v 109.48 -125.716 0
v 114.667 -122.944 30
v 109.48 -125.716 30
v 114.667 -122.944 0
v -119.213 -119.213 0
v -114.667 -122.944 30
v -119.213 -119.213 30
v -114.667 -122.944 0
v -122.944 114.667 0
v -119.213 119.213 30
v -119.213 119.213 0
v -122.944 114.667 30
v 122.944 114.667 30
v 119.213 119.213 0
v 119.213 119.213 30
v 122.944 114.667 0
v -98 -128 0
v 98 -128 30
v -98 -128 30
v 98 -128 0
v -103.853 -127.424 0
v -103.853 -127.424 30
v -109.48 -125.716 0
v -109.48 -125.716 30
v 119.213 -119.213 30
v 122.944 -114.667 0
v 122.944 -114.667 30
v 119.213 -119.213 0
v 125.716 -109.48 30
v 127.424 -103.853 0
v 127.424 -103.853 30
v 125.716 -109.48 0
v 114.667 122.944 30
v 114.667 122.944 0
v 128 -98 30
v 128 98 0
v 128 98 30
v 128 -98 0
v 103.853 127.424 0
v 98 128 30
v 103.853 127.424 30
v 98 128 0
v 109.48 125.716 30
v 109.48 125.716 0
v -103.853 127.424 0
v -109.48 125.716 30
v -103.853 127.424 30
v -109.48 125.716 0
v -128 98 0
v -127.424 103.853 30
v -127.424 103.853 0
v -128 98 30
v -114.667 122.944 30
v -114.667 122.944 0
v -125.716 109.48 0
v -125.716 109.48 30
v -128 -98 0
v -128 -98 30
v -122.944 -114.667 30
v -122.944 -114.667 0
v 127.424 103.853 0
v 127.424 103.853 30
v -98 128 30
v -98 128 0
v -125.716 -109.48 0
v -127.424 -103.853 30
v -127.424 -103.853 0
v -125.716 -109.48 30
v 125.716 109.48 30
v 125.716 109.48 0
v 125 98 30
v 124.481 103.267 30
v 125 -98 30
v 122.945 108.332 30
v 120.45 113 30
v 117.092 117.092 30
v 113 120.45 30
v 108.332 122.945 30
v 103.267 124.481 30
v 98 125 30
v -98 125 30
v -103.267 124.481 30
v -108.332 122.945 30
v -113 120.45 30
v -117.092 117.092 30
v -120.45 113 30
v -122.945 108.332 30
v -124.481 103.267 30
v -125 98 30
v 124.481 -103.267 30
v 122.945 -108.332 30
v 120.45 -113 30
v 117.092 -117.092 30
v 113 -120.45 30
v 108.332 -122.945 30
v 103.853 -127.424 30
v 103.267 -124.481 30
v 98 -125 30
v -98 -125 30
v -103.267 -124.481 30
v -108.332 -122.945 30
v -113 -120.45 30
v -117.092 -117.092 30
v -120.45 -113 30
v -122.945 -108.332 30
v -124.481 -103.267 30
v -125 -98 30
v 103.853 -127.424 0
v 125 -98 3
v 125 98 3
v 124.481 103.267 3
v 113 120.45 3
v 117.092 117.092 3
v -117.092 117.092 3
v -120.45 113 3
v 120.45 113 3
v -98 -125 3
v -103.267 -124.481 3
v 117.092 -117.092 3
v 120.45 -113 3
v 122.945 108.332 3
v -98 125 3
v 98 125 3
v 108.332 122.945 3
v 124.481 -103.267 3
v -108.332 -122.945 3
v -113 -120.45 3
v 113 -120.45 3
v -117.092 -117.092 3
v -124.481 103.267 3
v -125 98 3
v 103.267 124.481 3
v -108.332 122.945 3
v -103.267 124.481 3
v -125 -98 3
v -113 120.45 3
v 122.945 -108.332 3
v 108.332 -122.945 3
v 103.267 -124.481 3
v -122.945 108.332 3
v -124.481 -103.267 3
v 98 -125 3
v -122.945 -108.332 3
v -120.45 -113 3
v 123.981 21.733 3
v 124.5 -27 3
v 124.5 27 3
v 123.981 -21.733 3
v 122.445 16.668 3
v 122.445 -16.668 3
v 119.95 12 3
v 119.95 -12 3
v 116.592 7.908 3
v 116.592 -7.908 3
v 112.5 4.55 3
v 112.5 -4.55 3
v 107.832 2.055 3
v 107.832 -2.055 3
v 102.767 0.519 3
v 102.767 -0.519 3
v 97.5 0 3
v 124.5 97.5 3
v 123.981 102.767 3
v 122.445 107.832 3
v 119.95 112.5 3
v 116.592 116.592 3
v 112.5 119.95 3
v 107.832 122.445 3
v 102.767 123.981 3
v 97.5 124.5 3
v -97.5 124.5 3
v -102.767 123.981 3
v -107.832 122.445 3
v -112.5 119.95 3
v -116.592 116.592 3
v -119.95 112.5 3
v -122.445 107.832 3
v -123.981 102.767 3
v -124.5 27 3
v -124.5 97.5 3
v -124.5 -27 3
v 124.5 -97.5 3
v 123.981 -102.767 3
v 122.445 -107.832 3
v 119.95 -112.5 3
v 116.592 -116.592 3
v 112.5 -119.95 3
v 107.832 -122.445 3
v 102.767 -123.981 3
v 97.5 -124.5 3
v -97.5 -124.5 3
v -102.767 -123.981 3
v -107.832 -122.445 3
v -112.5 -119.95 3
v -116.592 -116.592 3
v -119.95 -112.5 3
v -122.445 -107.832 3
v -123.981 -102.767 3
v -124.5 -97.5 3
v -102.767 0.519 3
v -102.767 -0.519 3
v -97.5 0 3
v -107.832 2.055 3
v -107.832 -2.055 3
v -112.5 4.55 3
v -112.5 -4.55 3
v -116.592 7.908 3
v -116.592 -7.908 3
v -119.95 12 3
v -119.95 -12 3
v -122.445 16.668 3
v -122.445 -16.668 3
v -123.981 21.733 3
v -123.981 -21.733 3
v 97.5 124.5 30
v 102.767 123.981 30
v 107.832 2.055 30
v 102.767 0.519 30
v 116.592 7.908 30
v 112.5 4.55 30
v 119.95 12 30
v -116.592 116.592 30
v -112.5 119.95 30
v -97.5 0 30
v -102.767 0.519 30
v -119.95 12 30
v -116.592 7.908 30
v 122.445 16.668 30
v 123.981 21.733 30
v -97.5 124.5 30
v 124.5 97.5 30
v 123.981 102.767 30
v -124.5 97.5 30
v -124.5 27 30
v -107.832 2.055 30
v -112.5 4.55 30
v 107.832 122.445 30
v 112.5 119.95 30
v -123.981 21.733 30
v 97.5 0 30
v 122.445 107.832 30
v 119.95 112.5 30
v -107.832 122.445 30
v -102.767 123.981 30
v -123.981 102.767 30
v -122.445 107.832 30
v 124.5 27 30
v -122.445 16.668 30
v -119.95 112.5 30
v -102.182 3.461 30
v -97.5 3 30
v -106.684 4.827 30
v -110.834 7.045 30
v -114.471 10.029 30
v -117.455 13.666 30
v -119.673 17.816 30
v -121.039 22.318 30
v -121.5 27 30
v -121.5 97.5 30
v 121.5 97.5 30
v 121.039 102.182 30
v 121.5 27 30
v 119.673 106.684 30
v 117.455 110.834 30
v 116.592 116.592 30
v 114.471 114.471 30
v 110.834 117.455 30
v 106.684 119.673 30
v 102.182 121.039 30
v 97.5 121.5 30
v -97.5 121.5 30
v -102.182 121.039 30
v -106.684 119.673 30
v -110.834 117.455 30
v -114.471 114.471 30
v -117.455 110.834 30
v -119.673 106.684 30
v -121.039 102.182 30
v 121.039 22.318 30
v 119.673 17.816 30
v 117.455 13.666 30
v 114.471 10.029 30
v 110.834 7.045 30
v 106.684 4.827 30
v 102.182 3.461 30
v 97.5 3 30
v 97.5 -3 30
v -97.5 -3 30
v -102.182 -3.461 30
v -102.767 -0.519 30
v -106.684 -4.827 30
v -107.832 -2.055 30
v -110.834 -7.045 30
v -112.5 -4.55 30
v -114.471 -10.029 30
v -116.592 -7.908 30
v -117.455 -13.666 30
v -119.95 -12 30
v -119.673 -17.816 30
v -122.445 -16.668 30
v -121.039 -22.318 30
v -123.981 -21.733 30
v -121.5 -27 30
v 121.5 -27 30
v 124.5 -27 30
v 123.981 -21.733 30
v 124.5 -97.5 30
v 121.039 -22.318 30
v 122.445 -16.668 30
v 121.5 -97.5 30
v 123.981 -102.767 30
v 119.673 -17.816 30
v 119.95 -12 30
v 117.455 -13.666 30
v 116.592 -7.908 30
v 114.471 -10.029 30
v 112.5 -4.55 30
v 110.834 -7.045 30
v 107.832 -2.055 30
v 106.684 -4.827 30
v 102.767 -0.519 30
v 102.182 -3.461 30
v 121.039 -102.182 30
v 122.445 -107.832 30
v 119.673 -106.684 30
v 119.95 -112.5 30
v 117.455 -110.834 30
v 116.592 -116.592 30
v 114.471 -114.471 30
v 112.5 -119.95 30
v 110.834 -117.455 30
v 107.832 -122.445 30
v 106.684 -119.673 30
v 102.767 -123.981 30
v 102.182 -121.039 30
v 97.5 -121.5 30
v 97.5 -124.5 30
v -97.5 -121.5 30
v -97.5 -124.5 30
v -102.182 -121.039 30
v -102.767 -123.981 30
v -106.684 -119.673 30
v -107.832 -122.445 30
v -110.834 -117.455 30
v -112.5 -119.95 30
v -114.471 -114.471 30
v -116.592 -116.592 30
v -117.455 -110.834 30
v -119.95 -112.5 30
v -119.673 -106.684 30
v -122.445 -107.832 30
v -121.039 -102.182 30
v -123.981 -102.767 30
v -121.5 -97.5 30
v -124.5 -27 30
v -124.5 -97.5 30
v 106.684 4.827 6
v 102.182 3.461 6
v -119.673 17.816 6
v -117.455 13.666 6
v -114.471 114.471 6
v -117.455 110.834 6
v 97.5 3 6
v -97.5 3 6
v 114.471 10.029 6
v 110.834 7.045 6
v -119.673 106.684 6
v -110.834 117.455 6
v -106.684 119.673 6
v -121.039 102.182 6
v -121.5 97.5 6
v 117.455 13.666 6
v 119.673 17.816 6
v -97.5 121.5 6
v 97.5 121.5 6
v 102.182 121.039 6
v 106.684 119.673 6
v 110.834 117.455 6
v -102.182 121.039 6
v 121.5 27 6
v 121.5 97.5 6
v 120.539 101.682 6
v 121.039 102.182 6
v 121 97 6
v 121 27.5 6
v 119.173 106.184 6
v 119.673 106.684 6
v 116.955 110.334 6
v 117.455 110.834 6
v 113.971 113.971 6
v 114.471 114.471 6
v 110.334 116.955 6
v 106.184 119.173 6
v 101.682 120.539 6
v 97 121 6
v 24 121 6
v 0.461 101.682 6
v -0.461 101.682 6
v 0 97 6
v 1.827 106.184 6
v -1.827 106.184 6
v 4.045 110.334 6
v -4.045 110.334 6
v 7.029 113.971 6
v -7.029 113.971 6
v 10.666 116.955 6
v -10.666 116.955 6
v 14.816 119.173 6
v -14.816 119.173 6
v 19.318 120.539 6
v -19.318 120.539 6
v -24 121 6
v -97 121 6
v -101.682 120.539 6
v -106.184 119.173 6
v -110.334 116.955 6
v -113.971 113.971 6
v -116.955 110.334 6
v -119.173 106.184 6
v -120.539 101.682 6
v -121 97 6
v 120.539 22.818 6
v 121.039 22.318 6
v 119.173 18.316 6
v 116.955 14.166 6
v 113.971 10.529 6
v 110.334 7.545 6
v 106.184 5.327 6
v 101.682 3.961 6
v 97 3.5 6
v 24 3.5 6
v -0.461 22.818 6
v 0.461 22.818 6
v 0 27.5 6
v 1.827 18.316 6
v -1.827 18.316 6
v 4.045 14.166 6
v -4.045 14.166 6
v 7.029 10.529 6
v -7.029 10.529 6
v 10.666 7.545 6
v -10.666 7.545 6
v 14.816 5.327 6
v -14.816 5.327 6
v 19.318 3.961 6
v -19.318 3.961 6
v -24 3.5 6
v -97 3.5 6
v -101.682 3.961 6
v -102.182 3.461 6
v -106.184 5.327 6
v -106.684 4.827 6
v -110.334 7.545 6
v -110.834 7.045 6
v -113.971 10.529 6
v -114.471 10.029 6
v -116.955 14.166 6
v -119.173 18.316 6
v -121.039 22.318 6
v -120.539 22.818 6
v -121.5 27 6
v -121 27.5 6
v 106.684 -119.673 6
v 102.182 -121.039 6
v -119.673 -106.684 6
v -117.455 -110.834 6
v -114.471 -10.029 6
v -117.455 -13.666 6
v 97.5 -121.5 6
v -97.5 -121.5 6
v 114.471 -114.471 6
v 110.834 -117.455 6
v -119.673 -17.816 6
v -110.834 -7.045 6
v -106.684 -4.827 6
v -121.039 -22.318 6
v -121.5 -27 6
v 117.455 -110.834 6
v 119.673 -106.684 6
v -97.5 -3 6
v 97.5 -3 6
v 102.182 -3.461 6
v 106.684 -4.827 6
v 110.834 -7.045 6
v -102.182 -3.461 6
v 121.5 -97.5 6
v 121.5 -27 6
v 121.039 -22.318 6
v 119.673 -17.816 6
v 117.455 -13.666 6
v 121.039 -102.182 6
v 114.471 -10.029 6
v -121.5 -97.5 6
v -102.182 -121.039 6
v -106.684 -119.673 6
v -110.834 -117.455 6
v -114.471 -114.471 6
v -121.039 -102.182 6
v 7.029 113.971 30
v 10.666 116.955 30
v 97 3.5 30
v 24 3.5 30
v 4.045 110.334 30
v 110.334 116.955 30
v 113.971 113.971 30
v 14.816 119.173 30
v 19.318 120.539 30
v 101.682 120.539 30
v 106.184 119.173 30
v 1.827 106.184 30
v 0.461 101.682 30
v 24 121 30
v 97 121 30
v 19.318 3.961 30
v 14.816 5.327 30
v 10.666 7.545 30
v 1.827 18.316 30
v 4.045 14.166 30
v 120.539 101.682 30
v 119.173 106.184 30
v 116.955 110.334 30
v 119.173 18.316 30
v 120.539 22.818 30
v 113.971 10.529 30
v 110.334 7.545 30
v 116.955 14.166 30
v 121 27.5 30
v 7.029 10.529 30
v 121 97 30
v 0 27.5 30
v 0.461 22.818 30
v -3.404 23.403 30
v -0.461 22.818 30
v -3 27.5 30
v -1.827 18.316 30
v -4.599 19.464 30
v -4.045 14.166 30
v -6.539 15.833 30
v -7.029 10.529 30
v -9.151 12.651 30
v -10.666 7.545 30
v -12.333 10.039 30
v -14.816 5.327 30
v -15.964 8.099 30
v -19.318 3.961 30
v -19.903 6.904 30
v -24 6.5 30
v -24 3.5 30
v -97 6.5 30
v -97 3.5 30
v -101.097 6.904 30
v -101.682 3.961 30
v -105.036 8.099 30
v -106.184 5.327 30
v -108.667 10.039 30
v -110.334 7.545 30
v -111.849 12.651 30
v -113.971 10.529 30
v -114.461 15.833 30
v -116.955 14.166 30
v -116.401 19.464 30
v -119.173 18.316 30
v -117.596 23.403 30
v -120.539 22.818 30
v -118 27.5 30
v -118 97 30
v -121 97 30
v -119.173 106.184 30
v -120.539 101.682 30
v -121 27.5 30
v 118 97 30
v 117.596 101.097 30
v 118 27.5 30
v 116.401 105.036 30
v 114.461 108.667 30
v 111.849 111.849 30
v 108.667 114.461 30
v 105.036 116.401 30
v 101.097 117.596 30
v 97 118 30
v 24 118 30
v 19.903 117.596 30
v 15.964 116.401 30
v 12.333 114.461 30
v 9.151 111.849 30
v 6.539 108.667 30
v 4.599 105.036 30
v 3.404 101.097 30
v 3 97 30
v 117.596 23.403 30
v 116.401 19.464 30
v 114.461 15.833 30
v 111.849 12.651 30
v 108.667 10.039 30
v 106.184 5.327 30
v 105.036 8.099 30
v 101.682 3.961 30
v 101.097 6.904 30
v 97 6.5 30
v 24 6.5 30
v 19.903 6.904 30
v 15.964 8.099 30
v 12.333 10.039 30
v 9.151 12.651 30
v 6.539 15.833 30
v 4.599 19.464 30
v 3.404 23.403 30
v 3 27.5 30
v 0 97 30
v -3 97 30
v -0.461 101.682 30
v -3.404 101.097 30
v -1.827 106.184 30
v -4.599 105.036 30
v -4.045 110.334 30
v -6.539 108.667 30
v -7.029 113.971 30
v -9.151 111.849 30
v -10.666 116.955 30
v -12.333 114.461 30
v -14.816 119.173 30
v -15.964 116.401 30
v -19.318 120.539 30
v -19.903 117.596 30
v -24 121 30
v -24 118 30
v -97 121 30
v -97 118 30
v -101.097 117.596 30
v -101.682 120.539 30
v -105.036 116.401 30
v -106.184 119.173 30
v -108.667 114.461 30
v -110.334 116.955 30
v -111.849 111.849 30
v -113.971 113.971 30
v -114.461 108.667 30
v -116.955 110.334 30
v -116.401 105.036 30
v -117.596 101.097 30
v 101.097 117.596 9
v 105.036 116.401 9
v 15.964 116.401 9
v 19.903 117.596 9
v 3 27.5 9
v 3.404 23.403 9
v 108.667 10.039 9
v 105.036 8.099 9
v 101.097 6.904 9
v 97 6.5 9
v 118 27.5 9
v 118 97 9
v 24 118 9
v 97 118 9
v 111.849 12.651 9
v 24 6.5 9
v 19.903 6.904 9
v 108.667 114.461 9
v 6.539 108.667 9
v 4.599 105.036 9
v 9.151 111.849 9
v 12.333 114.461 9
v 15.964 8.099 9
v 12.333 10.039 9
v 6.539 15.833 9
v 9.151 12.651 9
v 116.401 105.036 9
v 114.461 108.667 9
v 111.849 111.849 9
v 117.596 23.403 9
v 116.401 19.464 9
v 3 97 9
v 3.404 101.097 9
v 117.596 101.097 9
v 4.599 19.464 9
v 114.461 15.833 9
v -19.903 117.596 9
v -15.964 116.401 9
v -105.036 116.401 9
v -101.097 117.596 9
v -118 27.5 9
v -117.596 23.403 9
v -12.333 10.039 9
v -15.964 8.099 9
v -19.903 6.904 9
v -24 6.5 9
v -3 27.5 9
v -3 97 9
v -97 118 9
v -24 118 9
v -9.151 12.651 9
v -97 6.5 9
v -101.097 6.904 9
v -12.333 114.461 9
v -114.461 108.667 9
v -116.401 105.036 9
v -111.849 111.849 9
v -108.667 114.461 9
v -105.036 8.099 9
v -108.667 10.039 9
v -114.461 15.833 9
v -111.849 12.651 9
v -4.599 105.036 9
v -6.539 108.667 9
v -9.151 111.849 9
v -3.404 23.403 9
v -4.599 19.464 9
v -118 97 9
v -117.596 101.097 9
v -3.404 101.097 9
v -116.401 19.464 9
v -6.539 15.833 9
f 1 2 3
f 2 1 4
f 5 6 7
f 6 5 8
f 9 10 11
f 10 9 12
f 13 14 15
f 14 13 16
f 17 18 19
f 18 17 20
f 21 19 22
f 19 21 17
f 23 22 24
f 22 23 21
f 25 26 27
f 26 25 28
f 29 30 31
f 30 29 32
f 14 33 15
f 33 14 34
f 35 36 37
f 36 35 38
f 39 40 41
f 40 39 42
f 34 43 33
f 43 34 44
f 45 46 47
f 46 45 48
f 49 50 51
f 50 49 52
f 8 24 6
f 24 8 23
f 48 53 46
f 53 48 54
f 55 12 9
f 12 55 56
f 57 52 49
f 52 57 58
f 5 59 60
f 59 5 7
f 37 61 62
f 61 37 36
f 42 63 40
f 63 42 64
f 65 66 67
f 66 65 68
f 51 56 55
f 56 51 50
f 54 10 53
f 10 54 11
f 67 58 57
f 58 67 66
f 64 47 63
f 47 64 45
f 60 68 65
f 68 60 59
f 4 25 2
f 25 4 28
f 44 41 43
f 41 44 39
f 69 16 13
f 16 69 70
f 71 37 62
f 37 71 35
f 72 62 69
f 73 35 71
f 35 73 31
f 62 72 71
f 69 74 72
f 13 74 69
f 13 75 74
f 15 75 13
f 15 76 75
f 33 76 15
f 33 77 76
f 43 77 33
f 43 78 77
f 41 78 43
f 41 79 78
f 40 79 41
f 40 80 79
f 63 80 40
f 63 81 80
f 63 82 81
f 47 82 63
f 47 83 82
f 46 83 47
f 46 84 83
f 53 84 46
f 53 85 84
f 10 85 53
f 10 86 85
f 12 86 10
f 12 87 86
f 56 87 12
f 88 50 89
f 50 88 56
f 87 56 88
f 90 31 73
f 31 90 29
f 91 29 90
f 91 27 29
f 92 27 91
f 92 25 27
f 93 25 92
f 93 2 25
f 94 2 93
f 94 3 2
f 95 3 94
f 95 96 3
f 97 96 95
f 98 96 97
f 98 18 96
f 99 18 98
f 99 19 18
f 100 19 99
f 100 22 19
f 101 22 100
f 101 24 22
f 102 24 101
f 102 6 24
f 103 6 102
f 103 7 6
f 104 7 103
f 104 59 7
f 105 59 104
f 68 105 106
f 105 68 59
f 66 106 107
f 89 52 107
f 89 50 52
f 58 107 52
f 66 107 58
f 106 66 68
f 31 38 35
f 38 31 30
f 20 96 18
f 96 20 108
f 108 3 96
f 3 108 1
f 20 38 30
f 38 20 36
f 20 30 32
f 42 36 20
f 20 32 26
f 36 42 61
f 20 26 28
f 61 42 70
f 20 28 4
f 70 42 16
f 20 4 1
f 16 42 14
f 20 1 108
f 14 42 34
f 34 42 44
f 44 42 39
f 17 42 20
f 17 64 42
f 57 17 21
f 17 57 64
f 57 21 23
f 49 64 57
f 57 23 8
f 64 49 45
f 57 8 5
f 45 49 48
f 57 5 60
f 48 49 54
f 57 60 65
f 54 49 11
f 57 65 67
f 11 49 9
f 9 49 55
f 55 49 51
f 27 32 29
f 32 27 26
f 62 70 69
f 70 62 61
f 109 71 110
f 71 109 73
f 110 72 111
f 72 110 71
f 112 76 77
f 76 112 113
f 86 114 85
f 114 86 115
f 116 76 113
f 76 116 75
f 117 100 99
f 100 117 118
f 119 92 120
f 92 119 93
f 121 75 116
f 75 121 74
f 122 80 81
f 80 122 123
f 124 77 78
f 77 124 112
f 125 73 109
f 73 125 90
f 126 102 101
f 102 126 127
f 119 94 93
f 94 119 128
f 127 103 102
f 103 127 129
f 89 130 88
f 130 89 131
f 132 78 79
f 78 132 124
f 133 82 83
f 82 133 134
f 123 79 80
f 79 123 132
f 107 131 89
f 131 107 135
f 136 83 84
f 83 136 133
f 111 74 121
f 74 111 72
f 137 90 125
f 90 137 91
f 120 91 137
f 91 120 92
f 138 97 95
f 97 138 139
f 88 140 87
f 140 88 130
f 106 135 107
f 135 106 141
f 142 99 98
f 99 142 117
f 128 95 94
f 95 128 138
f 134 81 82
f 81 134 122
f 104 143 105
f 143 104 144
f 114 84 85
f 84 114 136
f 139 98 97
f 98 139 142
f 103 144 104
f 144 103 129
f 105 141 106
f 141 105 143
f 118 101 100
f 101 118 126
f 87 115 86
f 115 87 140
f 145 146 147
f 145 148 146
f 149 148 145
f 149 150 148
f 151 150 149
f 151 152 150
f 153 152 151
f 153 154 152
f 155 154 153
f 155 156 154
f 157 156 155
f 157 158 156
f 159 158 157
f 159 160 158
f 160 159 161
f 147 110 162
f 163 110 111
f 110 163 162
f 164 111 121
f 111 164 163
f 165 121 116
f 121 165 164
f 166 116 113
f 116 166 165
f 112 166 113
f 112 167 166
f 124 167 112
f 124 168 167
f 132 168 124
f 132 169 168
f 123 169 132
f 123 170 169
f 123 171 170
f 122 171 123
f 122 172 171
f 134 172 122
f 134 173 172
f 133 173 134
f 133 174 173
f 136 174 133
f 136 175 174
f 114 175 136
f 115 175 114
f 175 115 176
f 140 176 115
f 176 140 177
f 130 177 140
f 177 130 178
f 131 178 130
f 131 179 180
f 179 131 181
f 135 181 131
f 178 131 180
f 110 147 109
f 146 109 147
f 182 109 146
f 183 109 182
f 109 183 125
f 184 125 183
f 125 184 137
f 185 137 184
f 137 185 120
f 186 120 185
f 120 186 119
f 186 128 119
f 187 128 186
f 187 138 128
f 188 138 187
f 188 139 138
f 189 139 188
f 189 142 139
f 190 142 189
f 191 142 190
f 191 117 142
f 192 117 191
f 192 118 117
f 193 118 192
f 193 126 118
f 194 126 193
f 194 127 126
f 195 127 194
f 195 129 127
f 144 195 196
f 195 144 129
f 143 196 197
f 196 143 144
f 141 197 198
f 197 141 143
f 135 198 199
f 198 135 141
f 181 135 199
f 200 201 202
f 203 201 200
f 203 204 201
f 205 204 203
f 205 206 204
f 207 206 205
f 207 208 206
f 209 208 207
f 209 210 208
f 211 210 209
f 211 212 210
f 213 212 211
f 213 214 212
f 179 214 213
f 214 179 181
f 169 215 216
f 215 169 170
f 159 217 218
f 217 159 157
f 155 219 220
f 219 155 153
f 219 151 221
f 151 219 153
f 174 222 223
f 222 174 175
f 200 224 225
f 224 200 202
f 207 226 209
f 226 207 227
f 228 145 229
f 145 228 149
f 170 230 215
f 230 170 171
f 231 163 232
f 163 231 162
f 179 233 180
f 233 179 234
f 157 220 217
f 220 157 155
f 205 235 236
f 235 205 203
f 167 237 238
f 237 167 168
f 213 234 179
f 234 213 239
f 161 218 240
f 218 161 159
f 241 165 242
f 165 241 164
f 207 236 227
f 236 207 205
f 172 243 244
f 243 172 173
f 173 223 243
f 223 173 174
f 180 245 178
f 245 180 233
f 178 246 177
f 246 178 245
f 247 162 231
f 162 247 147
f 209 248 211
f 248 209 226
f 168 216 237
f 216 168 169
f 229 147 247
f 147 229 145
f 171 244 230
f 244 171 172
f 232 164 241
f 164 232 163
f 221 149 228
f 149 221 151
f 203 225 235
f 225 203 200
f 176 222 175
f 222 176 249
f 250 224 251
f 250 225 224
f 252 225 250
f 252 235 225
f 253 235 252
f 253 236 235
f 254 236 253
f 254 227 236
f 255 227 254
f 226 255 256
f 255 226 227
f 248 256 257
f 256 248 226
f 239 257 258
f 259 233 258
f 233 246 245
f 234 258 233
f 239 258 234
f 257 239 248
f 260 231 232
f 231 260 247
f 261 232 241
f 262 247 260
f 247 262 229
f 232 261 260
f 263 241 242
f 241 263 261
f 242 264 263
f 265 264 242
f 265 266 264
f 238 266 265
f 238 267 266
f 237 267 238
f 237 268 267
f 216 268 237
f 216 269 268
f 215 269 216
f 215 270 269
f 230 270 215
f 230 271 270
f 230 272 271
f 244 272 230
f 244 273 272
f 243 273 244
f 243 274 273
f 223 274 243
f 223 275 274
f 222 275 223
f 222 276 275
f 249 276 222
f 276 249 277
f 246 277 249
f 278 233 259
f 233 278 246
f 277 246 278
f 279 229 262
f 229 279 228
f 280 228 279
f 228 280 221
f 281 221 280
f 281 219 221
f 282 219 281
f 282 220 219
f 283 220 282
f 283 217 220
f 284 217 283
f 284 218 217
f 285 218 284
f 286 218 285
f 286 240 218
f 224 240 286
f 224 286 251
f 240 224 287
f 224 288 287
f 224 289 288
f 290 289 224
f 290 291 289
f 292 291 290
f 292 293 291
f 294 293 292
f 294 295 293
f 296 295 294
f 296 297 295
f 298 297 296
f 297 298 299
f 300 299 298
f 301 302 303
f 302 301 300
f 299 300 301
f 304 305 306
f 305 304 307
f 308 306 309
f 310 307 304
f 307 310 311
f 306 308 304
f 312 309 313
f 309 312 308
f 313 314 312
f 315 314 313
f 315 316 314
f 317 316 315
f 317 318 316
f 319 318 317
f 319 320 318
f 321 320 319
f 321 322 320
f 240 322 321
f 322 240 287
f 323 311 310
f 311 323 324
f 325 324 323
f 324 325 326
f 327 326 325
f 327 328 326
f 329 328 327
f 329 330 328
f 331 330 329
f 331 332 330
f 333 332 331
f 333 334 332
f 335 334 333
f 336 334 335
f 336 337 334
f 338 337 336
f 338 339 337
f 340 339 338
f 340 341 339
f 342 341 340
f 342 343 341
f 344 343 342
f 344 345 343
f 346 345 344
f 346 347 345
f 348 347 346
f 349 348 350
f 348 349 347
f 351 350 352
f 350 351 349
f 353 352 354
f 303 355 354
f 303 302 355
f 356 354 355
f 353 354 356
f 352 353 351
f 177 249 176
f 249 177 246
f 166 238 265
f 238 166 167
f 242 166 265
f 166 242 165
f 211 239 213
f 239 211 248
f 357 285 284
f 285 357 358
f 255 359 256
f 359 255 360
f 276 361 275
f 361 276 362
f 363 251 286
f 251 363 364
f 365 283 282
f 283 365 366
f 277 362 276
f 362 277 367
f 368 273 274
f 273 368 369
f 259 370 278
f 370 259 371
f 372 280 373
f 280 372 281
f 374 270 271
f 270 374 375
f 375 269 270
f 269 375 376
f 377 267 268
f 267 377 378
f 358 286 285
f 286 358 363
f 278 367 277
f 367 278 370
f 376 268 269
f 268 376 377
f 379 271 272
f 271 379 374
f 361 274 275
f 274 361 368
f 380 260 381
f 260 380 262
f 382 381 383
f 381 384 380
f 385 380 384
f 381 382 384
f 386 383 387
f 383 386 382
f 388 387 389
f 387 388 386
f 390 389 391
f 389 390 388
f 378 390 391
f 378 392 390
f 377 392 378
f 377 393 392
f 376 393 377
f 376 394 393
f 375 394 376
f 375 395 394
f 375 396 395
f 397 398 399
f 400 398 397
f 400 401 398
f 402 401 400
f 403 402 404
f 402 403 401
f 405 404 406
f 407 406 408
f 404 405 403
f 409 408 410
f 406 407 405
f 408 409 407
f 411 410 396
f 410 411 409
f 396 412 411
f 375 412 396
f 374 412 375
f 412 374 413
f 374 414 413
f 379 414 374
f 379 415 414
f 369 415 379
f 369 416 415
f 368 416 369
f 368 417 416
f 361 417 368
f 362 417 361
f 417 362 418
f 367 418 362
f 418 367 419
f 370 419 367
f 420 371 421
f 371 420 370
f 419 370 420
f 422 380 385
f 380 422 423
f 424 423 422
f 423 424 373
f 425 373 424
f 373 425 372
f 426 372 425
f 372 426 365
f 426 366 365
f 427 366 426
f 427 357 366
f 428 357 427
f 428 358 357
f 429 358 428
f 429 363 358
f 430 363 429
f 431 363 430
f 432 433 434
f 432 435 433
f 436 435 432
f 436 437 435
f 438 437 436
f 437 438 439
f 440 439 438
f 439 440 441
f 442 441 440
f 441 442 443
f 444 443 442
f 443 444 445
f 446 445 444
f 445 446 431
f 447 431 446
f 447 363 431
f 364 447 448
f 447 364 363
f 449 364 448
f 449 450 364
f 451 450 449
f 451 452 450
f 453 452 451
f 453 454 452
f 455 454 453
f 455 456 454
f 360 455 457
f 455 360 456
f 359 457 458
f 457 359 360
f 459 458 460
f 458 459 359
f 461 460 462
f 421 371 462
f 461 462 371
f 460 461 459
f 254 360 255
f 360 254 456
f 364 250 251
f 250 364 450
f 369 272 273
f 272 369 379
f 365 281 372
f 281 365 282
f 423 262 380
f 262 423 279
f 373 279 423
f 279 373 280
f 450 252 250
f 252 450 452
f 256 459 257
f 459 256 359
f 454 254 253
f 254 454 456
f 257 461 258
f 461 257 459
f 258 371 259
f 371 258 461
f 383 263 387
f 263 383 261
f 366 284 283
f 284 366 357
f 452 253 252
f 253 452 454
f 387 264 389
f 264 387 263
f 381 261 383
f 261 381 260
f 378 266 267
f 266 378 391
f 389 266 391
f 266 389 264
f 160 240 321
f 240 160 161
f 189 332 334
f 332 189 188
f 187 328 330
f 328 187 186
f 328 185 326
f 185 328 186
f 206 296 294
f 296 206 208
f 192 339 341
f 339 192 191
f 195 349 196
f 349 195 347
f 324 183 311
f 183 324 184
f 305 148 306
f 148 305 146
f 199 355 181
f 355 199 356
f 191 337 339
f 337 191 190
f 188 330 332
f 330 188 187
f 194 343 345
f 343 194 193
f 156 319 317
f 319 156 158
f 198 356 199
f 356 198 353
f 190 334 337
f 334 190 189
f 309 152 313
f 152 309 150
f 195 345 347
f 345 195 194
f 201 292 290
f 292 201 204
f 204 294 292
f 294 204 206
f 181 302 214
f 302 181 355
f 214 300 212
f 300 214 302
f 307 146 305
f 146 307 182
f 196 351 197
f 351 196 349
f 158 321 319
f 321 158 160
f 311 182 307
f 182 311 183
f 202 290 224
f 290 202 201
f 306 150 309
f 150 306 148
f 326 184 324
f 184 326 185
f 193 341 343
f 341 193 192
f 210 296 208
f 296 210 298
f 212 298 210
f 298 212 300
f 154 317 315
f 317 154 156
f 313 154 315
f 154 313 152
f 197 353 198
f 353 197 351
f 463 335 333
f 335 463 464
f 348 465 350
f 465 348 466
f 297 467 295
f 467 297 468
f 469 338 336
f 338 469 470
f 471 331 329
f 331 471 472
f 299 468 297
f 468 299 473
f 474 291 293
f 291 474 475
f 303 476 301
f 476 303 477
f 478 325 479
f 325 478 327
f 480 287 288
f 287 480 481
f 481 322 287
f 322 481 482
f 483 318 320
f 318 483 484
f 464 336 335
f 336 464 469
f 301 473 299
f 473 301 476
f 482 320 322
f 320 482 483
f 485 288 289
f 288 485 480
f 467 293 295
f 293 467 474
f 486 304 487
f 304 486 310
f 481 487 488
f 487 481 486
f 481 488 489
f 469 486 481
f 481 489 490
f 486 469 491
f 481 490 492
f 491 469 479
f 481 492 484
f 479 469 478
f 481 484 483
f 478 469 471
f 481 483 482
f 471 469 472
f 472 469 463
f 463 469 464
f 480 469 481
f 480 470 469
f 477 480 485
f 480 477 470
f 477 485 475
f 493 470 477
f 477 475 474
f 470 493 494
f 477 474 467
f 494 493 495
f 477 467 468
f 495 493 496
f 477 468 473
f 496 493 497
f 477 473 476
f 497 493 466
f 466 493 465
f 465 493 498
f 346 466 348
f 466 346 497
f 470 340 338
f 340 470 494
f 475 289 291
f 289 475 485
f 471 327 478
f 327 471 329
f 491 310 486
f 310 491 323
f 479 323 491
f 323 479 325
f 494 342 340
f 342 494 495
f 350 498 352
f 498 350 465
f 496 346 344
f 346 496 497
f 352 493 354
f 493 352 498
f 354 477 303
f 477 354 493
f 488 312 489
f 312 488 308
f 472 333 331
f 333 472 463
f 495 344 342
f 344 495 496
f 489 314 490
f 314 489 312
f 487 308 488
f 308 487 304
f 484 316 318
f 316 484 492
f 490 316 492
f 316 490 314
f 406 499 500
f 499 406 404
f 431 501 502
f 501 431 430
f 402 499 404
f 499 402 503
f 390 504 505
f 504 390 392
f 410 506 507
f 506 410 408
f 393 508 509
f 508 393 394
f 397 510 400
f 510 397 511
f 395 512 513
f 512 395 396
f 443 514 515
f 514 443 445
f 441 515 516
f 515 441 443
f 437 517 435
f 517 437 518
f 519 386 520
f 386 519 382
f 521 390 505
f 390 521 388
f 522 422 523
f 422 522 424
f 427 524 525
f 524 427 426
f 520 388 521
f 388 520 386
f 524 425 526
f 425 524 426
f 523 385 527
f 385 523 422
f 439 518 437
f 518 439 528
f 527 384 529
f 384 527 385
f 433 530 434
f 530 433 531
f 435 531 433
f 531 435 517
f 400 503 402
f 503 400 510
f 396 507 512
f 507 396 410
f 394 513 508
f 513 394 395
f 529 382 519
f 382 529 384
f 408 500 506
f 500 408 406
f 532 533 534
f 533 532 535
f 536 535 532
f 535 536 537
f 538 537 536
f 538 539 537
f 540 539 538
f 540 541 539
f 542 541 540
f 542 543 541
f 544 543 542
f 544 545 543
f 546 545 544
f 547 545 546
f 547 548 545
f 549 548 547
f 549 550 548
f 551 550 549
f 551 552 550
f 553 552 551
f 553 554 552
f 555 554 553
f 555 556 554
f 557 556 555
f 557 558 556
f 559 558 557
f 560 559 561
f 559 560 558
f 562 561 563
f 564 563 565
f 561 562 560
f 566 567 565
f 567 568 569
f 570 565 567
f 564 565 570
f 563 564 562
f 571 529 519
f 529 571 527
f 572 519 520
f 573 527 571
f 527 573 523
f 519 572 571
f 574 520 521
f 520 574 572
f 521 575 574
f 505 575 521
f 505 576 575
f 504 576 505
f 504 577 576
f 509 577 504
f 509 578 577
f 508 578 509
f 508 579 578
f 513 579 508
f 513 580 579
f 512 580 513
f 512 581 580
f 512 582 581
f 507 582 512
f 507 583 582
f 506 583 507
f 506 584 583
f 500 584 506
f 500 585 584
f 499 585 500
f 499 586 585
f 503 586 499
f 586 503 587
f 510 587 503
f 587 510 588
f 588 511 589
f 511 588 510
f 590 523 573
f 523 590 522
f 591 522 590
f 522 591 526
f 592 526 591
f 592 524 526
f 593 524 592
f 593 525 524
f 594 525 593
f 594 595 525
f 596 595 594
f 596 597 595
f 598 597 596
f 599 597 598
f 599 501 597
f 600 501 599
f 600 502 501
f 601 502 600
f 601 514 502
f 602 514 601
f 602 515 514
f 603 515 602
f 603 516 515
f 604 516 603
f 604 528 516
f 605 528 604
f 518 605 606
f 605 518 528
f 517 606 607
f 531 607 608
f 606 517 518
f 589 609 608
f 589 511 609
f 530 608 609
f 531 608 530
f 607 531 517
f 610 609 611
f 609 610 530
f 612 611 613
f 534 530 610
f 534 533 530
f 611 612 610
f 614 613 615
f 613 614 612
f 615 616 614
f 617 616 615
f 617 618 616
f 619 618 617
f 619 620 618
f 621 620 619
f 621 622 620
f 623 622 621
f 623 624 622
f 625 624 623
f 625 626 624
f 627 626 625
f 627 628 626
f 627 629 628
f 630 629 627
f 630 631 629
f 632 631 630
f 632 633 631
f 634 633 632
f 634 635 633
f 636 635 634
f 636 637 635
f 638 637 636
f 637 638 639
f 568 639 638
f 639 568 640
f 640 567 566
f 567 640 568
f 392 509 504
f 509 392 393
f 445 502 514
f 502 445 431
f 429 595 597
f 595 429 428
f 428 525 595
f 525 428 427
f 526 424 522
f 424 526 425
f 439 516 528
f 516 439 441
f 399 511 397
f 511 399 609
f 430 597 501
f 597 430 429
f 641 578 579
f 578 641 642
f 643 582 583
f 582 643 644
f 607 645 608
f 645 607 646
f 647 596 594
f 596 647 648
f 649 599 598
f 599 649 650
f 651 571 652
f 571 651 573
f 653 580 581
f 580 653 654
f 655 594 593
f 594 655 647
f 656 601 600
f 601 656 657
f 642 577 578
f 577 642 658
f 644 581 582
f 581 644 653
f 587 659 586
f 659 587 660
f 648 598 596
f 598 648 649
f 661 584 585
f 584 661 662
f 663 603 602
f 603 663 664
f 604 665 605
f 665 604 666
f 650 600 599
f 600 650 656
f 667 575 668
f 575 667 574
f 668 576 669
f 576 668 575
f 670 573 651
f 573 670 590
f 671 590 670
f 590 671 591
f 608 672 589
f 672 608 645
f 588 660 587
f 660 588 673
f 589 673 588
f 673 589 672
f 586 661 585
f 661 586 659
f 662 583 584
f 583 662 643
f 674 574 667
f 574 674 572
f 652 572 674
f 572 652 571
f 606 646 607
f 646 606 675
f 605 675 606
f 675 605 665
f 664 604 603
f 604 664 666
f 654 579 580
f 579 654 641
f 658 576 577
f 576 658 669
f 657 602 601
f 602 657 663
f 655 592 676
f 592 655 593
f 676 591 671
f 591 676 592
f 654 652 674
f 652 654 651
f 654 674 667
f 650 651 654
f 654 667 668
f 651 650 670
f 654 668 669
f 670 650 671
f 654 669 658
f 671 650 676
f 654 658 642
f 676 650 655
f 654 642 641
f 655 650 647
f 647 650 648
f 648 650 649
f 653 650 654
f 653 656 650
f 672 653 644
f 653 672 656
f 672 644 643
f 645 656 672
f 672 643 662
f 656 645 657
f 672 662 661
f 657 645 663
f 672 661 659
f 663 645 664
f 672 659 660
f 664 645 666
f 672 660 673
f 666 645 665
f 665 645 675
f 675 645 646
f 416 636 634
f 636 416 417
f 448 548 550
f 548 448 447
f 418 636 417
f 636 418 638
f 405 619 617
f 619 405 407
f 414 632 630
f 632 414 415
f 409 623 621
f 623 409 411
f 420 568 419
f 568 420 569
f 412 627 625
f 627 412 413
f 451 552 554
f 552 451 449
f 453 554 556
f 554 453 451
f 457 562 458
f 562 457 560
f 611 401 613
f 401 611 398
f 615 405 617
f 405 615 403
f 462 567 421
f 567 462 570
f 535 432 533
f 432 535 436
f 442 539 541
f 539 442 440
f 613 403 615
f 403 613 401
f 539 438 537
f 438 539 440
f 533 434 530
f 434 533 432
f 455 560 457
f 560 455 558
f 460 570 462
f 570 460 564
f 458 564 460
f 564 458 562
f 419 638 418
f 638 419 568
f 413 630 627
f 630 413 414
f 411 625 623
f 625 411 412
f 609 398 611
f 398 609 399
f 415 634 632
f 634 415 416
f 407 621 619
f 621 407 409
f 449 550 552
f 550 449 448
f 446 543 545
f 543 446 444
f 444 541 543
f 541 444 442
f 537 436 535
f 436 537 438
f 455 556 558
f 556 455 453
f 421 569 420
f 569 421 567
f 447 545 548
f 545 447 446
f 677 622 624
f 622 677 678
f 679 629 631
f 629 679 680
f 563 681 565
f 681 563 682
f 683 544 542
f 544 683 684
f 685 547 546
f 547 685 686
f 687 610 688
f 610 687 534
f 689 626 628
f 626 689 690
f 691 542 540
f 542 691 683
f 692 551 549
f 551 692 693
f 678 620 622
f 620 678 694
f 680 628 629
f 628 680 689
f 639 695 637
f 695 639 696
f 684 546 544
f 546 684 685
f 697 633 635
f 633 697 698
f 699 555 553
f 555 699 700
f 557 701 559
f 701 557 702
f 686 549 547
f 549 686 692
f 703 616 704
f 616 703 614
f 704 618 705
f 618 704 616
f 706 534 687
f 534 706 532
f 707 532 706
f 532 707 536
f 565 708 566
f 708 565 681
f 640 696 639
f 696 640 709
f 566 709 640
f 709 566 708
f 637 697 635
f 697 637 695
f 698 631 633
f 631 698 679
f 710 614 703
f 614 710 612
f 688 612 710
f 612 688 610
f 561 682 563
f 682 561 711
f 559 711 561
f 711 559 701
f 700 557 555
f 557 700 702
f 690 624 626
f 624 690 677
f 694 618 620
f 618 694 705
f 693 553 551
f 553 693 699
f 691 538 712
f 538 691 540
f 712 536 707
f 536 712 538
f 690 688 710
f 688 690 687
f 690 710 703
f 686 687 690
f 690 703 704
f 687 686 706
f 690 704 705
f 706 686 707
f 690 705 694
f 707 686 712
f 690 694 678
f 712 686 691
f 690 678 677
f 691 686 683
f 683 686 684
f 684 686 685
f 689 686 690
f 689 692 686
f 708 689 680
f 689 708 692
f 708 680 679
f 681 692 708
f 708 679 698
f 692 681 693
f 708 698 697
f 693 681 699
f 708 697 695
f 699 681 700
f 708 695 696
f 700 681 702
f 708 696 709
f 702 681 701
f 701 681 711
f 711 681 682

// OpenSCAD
wall=3;
height=30;

x1 = 256;
y1 = x1;
r1 = 30;

x2 = x1 - wall*2 -1;
y2 = (y1 - wall*2 -1)/2;
r2 = r1 -wall;

x3 = (x2 - wall*2 -1)/2;
y3 = (y2 - wall*2 -1);
r3 = r2 -wall;


box(x1,y1,height, r1);
translate([0,y2/2,wall])
	box(x2,y2,height-wall, r2);
translate([0,-y2/2,wall])
	box(x2,y2,height-wall, r2);
translate([x3/2,y3/2+wall+1/2,wall*2])
	box(x3,y3,height-wall*2, r3);
translate([-x3/2,y3/2+wall+1/2,wall*2])
	box(x3,y3,height-wall*2, r3);


module box(largeur, profondeur, hauteur, rayon) {
	difference() {
		rounded_cube(largeur, profondeur, hauteur, rayon);
		translate([0,0,3])
			rounded_cube(largeur-wall*2, profondeur-wall*2, hauteur, rayon-wall);
	}
}

module rounded_cube(largeur, profondeur, hauteur, rayon) {
	x = largeur/2-rayon;
	y = profondeur/2-rayon;
	hull() {
		translate([-x, -y, 0])
			cylinder(hauteur, rayon, rayon, $fn=32);
		translate([ x, -y, 0])
			cylinder(hauteur, rayon, rayon, $fn=32);
		translate([ x,  y, 0])
			cylinder(hauteur, rayon, rayon, $fn=32);
		translate([-x,  y, 0])
			cylinder(hauteur, rayon, rayon, $fn=32);
	}
}
